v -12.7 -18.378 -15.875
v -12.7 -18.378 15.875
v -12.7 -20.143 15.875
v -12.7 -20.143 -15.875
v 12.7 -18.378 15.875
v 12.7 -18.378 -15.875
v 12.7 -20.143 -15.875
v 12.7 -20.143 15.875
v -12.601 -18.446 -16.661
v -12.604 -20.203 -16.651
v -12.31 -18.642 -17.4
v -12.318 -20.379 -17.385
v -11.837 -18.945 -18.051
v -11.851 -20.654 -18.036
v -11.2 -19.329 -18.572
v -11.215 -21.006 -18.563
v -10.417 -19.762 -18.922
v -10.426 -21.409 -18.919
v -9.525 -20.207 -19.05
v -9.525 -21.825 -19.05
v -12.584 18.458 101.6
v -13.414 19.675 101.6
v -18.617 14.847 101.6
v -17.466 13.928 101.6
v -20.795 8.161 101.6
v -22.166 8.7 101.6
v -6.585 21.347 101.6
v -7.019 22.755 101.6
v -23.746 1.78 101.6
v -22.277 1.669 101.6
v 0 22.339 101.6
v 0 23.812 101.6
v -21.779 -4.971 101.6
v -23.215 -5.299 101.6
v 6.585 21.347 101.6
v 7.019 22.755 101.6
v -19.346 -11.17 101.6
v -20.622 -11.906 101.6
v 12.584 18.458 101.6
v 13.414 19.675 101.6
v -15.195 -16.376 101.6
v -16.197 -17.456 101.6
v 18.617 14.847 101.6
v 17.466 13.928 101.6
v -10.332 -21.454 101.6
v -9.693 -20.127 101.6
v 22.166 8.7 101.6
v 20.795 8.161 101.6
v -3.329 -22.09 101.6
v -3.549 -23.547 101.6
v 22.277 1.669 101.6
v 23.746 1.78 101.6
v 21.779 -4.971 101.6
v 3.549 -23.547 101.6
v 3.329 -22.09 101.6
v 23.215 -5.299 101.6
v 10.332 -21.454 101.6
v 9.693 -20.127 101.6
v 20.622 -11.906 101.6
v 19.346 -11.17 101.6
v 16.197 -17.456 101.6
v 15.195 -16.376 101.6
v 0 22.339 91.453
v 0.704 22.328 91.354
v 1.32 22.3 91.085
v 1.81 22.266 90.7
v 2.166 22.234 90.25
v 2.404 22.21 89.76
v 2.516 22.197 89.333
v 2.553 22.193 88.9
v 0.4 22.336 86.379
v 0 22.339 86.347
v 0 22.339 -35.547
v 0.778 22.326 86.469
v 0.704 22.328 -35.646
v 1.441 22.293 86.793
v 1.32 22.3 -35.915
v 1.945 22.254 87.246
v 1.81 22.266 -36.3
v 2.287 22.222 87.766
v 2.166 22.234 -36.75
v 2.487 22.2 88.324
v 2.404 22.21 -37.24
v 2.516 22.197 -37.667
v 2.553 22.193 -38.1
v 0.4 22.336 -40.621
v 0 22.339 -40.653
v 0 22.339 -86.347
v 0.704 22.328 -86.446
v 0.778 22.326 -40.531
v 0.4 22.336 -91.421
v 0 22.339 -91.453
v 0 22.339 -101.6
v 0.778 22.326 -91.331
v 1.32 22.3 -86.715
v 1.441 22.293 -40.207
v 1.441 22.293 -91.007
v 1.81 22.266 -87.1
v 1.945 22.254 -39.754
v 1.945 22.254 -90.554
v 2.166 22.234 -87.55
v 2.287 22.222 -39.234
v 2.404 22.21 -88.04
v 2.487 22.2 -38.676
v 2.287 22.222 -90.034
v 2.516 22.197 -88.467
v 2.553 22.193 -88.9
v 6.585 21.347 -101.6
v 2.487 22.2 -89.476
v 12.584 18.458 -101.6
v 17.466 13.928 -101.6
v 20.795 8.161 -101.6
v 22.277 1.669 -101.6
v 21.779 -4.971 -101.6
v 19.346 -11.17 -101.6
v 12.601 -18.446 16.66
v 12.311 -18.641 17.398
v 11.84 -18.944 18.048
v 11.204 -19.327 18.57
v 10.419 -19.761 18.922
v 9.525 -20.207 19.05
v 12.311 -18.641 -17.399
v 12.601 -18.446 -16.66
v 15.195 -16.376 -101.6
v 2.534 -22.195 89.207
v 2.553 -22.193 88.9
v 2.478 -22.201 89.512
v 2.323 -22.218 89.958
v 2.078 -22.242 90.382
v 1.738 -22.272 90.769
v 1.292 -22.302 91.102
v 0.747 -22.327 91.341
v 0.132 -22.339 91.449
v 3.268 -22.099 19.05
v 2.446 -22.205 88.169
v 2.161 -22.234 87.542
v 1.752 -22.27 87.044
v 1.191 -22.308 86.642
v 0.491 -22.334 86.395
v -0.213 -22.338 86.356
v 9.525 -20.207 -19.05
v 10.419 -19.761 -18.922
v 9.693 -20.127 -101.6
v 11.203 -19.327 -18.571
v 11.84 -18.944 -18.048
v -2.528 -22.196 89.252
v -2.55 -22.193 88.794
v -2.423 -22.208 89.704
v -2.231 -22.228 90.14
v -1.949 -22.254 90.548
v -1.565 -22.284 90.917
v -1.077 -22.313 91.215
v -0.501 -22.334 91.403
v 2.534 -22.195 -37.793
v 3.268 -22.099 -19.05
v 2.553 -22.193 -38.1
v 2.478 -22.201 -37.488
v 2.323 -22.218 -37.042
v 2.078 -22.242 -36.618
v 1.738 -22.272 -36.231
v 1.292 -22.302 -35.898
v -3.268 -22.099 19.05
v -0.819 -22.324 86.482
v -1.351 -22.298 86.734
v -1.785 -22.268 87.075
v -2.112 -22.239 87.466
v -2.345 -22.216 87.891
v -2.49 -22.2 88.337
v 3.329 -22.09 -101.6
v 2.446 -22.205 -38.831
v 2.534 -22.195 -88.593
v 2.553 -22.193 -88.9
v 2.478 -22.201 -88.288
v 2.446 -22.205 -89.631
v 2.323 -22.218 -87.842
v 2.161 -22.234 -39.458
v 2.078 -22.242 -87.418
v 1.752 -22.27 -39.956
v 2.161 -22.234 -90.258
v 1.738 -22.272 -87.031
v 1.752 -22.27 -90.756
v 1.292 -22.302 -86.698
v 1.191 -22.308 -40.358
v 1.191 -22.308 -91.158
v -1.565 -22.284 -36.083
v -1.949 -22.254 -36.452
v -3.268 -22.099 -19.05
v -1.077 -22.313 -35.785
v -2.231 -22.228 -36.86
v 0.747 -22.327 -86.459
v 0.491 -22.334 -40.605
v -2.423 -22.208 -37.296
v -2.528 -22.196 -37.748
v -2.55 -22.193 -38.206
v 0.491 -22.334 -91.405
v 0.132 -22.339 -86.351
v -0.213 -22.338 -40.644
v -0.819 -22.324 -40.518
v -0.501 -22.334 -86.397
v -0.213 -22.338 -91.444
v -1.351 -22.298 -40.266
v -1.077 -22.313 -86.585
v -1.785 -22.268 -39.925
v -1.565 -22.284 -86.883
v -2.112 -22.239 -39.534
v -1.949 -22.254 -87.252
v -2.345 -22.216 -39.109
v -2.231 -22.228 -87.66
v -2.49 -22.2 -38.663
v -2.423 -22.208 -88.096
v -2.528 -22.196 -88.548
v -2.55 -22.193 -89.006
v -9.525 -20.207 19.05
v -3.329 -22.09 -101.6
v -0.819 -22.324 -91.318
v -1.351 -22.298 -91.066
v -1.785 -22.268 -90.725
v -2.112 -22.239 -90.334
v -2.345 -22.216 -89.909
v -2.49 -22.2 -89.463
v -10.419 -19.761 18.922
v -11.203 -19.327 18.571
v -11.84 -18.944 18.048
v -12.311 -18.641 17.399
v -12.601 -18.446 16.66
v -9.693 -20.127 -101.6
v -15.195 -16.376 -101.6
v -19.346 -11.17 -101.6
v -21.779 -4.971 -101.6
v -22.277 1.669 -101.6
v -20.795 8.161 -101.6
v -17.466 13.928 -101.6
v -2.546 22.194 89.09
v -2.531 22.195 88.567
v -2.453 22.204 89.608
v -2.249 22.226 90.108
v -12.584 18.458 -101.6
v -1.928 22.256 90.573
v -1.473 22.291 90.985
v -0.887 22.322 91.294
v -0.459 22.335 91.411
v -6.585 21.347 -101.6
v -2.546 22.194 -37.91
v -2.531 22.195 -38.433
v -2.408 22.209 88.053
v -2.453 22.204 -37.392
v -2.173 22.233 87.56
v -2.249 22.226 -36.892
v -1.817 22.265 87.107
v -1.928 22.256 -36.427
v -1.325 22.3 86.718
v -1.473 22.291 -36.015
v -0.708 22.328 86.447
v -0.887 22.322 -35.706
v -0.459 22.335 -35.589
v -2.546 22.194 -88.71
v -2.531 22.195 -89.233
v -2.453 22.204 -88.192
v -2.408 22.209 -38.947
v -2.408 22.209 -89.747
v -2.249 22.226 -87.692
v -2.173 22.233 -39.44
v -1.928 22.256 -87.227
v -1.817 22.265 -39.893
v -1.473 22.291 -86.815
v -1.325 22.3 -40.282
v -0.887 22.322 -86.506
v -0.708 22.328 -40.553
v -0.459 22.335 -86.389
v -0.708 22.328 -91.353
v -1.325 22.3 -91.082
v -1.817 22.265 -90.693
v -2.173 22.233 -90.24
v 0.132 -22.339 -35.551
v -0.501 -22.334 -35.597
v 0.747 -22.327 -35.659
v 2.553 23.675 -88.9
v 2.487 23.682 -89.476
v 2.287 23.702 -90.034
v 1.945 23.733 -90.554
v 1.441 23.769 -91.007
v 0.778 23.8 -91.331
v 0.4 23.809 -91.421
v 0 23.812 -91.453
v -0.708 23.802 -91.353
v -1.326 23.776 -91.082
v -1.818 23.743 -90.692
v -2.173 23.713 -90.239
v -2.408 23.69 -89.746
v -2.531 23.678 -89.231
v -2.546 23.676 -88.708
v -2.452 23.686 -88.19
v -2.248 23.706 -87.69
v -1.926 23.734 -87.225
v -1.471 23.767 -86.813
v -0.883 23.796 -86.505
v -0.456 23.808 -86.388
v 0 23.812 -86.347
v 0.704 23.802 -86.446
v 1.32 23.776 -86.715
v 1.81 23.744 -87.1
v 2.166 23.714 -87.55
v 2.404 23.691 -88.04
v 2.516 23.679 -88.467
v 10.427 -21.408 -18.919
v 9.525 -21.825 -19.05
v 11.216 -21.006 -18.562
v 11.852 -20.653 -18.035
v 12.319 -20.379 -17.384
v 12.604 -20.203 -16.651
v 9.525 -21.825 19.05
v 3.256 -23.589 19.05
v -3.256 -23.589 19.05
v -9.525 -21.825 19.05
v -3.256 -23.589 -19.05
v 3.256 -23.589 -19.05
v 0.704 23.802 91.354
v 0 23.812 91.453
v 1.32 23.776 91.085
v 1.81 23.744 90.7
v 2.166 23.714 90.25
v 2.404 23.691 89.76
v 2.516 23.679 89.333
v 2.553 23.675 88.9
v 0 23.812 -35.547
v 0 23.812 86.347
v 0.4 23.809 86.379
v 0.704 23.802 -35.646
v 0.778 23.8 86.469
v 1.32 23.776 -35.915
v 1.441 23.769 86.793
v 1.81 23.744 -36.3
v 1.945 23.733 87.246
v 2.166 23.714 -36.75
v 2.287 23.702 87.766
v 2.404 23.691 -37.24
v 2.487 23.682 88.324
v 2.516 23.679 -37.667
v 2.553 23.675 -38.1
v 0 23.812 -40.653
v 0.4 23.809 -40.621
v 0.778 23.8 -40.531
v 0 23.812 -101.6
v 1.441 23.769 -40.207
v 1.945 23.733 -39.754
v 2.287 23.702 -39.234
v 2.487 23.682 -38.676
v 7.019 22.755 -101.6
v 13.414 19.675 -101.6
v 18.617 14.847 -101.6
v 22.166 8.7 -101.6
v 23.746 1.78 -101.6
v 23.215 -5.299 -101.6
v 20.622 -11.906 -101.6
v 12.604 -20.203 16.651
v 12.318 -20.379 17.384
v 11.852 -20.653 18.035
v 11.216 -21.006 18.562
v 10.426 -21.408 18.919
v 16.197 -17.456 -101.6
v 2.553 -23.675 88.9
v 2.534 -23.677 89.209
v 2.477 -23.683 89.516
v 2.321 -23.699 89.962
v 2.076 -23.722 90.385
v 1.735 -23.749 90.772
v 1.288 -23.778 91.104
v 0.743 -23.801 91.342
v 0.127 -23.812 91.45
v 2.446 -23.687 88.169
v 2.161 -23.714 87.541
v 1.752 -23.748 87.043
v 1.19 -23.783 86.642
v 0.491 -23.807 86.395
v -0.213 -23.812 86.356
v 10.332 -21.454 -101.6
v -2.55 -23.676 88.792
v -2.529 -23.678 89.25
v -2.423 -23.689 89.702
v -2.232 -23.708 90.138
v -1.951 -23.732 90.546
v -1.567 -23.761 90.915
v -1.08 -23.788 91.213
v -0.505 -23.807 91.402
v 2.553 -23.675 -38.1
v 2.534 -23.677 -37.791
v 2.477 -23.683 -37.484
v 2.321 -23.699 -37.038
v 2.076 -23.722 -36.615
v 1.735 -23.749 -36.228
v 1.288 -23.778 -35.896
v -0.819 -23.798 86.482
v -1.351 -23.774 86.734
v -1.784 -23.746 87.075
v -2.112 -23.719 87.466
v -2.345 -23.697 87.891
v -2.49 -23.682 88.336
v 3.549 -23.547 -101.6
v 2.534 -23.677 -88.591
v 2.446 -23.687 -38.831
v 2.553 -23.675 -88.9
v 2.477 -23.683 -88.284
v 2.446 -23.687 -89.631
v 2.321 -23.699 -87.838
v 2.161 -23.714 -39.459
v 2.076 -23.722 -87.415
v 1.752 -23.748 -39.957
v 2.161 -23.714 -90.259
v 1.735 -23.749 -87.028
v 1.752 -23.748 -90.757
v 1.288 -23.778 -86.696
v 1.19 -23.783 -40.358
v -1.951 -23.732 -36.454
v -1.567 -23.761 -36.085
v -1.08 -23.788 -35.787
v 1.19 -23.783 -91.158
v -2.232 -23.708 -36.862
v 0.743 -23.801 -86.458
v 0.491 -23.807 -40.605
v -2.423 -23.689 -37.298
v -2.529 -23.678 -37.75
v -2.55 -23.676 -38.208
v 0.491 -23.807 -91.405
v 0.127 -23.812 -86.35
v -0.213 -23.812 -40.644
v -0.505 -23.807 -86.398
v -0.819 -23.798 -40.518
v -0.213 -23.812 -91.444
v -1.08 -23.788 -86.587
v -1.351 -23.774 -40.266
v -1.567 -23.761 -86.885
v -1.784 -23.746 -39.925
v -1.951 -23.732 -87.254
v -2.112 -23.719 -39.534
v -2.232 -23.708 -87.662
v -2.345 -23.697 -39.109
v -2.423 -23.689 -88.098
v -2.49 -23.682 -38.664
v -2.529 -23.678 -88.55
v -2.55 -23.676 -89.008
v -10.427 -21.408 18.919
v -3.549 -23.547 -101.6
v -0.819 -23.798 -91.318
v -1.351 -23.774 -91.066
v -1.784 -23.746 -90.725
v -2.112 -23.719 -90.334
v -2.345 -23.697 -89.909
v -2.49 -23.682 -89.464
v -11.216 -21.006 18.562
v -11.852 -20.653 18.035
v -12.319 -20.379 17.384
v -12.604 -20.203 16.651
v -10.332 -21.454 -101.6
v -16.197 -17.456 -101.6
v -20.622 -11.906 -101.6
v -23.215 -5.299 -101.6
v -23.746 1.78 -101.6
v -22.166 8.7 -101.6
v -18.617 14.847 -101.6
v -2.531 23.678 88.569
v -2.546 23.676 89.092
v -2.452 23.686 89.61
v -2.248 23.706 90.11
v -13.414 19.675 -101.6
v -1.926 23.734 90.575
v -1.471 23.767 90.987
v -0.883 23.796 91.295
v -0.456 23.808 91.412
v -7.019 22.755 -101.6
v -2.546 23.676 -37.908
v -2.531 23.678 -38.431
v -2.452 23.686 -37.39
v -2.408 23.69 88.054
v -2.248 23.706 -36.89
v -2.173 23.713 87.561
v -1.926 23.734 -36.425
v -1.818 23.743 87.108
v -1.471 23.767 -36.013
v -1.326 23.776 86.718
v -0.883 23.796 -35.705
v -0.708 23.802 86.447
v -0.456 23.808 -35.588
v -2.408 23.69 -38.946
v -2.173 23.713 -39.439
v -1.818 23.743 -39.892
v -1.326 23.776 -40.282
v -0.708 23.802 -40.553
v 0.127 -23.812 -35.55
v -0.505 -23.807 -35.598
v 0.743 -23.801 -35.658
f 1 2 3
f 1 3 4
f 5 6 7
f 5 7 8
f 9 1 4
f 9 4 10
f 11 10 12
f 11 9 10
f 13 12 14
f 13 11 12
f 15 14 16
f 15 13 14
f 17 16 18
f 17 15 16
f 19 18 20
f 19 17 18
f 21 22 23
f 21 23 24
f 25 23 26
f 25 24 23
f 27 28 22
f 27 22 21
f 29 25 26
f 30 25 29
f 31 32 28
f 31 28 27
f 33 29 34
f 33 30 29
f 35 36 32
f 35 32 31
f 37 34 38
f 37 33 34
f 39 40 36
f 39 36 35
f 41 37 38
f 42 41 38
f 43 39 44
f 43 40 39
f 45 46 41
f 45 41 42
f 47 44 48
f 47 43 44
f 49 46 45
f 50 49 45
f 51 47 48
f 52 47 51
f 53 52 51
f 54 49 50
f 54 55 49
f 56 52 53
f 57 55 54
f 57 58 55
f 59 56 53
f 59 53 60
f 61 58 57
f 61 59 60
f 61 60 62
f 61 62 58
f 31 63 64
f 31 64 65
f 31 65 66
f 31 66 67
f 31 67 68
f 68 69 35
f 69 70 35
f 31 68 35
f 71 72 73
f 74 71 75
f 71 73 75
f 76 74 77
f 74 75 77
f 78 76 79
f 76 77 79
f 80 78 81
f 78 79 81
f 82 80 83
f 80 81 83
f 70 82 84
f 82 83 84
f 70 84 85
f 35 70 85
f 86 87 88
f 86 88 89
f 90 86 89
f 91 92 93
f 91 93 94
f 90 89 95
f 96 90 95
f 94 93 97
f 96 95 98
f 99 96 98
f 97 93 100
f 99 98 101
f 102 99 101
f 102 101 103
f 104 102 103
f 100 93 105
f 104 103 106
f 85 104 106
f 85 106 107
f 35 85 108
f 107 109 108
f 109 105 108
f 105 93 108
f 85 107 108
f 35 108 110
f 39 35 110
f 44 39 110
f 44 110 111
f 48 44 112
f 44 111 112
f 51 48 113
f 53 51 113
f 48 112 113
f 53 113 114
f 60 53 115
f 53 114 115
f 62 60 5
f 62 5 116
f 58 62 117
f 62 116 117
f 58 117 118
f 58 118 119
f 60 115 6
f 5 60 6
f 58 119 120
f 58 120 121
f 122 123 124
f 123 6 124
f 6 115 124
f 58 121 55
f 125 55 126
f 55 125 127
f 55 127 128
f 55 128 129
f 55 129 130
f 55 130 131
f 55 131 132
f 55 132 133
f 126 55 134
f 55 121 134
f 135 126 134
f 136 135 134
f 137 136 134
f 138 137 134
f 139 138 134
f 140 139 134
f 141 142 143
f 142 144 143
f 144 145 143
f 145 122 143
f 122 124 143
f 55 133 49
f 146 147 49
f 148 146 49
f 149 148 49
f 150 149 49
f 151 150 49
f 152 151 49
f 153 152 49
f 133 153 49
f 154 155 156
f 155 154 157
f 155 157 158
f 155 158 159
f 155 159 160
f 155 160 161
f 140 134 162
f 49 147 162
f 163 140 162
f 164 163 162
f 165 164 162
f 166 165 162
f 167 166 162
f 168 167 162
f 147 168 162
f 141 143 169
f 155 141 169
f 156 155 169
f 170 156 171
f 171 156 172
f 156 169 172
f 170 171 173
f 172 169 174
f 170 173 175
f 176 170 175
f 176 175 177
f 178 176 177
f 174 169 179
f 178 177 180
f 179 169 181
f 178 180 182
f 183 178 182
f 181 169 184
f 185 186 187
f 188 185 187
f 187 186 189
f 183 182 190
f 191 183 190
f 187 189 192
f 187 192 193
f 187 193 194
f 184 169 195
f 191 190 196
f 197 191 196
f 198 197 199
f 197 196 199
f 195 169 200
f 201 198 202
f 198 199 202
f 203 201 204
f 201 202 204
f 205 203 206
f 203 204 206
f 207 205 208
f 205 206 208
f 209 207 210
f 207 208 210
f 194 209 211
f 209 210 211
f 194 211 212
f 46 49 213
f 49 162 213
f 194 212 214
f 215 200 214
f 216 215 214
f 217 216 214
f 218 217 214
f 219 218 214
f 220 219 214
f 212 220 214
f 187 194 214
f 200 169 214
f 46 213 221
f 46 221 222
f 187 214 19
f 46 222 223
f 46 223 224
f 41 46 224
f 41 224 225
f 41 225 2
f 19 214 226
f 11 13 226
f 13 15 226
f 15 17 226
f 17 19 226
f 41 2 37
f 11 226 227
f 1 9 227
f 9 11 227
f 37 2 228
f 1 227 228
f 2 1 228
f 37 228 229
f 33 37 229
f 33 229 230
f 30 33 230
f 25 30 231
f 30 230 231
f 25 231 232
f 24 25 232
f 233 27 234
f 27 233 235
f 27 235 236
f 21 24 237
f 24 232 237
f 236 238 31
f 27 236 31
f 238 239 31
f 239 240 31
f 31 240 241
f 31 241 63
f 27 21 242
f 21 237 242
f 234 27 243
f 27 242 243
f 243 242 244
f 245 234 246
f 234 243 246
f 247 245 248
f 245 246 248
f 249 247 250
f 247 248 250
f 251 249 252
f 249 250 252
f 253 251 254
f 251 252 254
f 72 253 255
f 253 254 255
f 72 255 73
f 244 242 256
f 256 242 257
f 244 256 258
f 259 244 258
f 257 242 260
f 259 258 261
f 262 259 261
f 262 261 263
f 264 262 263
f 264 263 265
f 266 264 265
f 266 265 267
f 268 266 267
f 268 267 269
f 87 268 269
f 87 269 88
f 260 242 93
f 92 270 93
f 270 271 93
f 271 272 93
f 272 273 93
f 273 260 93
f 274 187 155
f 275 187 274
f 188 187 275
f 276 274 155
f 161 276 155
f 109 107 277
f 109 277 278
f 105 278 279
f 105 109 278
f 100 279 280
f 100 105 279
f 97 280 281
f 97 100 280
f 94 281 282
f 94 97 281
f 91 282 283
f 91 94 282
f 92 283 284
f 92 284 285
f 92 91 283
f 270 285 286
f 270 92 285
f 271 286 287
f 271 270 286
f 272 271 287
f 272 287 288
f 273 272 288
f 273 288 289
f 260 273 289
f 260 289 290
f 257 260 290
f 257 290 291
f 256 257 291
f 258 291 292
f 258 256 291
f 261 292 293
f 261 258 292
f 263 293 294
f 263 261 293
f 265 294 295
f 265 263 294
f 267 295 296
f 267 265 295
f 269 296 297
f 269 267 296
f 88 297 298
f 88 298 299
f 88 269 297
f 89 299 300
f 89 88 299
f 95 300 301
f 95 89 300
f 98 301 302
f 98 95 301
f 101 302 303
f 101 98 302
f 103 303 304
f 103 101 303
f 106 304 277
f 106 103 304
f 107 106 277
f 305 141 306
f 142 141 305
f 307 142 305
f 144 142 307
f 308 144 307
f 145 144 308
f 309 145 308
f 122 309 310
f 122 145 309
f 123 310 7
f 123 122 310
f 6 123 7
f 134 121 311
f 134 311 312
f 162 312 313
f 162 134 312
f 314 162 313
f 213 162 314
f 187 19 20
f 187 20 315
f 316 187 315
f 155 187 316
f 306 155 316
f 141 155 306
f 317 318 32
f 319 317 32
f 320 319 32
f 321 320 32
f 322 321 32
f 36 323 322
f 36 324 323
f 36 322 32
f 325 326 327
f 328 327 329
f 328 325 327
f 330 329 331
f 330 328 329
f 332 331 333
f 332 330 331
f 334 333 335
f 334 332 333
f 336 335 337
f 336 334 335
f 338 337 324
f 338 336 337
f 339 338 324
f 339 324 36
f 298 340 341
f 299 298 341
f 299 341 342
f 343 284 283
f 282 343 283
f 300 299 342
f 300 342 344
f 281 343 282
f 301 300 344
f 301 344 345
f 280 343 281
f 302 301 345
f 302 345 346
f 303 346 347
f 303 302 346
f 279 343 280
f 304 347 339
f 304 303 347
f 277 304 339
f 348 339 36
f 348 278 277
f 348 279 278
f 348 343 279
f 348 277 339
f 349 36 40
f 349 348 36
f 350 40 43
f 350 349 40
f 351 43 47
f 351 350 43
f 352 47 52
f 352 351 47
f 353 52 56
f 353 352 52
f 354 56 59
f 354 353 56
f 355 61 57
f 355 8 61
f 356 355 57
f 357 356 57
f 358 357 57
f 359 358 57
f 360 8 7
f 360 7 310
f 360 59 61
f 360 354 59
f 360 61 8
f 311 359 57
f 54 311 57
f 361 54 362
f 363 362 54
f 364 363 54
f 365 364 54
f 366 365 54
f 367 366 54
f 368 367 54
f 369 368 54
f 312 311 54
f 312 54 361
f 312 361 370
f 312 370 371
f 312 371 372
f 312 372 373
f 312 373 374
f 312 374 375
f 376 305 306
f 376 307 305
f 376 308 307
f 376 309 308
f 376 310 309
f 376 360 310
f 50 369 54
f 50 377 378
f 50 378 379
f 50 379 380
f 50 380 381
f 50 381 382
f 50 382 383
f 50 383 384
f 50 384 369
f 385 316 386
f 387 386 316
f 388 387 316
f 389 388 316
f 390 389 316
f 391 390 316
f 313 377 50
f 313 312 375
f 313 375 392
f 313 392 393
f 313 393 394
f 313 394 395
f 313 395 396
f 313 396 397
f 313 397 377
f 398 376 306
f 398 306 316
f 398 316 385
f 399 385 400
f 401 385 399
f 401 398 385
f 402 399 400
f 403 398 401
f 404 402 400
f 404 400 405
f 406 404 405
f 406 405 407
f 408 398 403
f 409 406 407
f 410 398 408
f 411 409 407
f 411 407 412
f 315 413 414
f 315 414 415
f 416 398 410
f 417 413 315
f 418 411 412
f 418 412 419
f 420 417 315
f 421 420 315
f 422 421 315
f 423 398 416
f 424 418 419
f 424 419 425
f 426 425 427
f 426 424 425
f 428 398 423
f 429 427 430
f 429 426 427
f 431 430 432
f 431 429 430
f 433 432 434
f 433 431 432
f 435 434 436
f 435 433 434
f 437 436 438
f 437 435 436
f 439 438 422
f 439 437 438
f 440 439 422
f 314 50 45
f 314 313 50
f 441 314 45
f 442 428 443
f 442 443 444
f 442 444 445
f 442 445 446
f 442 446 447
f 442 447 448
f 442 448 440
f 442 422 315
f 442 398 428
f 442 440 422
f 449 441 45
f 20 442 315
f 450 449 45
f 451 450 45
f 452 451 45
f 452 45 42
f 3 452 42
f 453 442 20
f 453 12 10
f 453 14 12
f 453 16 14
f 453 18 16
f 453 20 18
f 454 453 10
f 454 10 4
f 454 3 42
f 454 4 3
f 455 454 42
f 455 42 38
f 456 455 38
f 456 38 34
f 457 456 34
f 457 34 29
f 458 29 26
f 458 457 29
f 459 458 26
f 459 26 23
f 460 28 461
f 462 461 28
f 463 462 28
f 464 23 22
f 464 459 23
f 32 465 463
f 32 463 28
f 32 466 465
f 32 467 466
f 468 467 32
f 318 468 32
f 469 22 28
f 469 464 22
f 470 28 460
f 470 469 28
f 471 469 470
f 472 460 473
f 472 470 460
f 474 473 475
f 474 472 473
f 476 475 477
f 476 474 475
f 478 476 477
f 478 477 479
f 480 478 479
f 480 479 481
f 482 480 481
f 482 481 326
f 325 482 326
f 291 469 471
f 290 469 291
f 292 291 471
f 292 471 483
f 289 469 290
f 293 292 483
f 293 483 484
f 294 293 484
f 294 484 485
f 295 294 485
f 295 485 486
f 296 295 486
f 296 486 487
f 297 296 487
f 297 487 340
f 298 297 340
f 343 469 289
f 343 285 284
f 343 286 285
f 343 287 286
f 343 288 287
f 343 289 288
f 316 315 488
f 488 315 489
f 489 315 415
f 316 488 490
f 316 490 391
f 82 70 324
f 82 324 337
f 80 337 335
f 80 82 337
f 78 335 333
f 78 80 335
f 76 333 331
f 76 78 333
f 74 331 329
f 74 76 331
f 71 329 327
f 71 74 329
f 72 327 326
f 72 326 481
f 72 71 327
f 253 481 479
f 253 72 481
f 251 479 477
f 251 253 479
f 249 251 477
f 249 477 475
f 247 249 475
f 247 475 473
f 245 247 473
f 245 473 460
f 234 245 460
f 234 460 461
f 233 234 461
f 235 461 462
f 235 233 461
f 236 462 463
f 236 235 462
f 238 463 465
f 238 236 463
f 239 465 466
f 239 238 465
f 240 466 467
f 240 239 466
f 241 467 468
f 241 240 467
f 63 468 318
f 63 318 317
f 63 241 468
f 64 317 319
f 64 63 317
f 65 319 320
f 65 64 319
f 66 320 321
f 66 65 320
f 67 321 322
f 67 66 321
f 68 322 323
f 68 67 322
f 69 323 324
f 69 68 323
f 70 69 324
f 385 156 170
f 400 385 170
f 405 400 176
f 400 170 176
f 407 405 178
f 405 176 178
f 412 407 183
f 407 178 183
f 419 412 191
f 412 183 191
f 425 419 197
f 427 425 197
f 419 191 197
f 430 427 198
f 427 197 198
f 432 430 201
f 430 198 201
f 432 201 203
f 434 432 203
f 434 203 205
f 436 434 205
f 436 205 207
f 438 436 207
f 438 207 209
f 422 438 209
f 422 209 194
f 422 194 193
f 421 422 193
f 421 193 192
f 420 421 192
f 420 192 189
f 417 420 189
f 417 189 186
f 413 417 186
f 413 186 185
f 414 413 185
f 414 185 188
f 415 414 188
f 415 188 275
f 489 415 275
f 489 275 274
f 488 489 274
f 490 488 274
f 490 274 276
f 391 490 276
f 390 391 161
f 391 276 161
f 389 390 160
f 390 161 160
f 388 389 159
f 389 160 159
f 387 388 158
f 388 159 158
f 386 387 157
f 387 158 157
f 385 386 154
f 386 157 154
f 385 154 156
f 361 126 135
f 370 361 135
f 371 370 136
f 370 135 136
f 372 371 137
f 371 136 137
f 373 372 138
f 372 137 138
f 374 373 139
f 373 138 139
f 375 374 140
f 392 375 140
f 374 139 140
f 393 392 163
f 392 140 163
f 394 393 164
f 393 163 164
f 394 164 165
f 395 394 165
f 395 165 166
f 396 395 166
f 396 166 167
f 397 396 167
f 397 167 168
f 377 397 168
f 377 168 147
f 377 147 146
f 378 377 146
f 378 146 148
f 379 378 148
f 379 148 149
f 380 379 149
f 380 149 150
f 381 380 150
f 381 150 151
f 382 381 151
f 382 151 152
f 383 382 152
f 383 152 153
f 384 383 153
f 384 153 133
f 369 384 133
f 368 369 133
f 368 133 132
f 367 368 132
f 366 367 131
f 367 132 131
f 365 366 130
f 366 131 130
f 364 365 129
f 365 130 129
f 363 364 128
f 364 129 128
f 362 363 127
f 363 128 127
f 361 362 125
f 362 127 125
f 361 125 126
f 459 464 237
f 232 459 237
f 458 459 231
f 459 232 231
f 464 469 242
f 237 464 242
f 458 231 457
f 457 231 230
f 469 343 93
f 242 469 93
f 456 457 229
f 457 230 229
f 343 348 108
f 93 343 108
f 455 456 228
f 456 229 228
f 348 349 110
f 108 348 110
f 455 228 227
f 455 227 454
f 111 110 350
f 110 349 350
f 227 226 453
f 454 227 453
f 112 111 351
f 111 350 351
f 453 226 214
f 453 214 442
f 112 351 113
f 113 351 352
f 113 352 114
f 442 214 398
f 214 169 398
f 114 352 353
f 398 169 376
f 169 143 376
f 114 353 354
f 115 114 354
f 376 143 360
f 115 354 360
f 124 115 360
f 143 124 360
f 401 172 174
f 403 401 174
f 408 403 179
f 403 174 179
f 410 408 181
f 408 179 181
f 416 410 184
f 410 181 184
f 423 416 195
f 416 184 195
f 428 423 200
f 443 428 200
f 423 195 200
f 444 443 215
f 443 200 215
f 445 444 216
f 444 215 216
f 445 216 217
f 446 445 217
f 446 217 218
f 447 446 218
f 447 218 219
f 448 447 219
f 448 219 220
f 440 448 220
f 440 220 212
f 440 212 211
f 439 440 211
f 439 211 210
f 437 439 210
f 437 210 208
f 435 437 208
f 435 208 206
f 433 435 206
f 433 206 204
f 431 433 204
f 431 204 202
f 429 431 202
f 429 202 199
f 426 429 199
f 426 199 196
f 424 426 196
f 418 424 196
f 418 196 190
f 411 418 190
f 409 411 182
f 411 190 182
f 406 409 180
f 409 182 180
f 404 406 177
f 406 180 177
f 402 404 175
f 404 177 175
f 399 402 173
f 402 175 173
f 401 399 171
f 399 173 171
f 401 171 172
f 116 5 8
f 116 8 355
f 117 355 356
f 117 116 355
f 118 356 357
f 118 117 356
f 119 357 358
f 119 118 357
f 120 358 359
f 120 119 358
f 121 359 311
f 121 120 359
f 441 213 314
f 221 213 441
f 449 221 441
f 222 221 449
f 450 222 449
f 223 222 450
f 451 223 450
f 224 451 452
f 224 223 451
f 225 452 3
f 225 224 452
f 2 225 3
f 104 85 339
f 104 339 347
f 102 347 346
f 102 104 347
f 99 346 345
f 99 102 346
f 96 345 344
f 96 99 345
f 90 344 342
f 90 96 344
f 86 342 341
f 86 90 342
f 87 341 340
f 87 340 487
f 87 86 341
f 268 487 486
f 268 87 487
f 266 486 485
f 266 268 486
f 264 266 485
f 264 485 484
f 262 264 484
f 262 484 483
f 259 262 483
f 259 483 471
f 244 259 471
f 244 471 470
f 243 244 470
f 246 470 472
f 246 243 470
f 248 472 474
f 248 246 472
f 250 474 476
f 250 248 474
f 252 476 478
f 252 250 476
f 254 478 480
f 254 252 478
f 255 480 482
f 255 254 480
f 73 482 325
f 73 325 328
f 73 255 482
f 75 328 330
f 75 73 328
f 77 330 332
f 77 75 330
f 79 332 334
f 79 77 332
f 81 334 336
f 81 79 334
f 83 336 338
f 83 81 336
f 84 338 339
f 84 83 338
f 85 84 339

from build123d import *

# Parameters (mm, degrees)
SKETCH3_W               = 203.2
SKETCH3_H               = 1.4732
SKETCH4_R               = 2.5527
CUT_EXTRUDE1_DEPTH      = 24.8125
CUT_EXTRUDE1_DEPTH_BACK = 24.8125
CUT_EXTRUDE2_DEPTH      = 24.8125001


with BuildPart() as part:
    # Sketch3 → Revolve1 (revolve)
    with BuildSketch(Plane(origin=(0, 0, 0), x_dir=(0, 0, -1), z_dir=(1, 0, 0))):
        with Locations((0, 23.0759)):
            Rectangle(SKETCH3_W, SKETCH3_H)
    revolve(axis=Axis((0, 0, 101.6), (0, 0, -1)))

    # Sketch4 → Cut-Extrude1 (cut, two sides)
    with BuildSketch(Plane(origin=(0, 0, 0), x_dir=(1, 0, 0), z_dir=(0, 1, 0))) as cut_extrude1_sk:
        with Locations((0, 88.9)):
            Circle(SKETCH4_R)
        with Locations((0, 38.1)):
            Circle(SKETCH4_R)
        with Locations((0, -88.9)):
            Circle(SKETCH4_R)
    extrude(amount=CUT_EXTRUDE1_DEPTH, mode=Mode.SUBTRACT)
    extrude(cut_extrude1_sk.sketch, amount=-CUT_EXTRUDE1_DEPTH_BACK, mode=Mode.SUBTRACT)

    # Sketch5 → Cut-Extrude2 (cut, through all)
    with BuildSketch(Plane(origin=(0, 0, 0), x_dir=(1, 0, 0), z_dir=(0, 1, 0))):
        with BuildLine():
            Line((9.525, -19.05), (-9.525, -19.05))
            ThreePointArc((-9.525, -19.05), (-11.77006403, -18.12006403), (-12.7, -15.875))
            Line((-12.7, -15.875), (-12.7, 15.875))
            ThreePointArc((-12.7, 15.875), (-11.77006403, 18.12006403), (-9.525, 19.05))
            Line((-9.525, 19.05), (9.525, 19.05))
            ThreePointArc((9.525, 19.05), (11.77006403, 18.12006403), (12.7, 15.875))
            Line((12.7, 15.875), (12.7, -15.875))
            ThreePointArc((12.7, -15.875), (11.77006403, -18.12006403), (9.525, -19.05))
        make_face()
    extrude(amount=-CUT_EXTRUDE2_DEPTH, mode=Mode.SUBTRACT)


solid = part.part
